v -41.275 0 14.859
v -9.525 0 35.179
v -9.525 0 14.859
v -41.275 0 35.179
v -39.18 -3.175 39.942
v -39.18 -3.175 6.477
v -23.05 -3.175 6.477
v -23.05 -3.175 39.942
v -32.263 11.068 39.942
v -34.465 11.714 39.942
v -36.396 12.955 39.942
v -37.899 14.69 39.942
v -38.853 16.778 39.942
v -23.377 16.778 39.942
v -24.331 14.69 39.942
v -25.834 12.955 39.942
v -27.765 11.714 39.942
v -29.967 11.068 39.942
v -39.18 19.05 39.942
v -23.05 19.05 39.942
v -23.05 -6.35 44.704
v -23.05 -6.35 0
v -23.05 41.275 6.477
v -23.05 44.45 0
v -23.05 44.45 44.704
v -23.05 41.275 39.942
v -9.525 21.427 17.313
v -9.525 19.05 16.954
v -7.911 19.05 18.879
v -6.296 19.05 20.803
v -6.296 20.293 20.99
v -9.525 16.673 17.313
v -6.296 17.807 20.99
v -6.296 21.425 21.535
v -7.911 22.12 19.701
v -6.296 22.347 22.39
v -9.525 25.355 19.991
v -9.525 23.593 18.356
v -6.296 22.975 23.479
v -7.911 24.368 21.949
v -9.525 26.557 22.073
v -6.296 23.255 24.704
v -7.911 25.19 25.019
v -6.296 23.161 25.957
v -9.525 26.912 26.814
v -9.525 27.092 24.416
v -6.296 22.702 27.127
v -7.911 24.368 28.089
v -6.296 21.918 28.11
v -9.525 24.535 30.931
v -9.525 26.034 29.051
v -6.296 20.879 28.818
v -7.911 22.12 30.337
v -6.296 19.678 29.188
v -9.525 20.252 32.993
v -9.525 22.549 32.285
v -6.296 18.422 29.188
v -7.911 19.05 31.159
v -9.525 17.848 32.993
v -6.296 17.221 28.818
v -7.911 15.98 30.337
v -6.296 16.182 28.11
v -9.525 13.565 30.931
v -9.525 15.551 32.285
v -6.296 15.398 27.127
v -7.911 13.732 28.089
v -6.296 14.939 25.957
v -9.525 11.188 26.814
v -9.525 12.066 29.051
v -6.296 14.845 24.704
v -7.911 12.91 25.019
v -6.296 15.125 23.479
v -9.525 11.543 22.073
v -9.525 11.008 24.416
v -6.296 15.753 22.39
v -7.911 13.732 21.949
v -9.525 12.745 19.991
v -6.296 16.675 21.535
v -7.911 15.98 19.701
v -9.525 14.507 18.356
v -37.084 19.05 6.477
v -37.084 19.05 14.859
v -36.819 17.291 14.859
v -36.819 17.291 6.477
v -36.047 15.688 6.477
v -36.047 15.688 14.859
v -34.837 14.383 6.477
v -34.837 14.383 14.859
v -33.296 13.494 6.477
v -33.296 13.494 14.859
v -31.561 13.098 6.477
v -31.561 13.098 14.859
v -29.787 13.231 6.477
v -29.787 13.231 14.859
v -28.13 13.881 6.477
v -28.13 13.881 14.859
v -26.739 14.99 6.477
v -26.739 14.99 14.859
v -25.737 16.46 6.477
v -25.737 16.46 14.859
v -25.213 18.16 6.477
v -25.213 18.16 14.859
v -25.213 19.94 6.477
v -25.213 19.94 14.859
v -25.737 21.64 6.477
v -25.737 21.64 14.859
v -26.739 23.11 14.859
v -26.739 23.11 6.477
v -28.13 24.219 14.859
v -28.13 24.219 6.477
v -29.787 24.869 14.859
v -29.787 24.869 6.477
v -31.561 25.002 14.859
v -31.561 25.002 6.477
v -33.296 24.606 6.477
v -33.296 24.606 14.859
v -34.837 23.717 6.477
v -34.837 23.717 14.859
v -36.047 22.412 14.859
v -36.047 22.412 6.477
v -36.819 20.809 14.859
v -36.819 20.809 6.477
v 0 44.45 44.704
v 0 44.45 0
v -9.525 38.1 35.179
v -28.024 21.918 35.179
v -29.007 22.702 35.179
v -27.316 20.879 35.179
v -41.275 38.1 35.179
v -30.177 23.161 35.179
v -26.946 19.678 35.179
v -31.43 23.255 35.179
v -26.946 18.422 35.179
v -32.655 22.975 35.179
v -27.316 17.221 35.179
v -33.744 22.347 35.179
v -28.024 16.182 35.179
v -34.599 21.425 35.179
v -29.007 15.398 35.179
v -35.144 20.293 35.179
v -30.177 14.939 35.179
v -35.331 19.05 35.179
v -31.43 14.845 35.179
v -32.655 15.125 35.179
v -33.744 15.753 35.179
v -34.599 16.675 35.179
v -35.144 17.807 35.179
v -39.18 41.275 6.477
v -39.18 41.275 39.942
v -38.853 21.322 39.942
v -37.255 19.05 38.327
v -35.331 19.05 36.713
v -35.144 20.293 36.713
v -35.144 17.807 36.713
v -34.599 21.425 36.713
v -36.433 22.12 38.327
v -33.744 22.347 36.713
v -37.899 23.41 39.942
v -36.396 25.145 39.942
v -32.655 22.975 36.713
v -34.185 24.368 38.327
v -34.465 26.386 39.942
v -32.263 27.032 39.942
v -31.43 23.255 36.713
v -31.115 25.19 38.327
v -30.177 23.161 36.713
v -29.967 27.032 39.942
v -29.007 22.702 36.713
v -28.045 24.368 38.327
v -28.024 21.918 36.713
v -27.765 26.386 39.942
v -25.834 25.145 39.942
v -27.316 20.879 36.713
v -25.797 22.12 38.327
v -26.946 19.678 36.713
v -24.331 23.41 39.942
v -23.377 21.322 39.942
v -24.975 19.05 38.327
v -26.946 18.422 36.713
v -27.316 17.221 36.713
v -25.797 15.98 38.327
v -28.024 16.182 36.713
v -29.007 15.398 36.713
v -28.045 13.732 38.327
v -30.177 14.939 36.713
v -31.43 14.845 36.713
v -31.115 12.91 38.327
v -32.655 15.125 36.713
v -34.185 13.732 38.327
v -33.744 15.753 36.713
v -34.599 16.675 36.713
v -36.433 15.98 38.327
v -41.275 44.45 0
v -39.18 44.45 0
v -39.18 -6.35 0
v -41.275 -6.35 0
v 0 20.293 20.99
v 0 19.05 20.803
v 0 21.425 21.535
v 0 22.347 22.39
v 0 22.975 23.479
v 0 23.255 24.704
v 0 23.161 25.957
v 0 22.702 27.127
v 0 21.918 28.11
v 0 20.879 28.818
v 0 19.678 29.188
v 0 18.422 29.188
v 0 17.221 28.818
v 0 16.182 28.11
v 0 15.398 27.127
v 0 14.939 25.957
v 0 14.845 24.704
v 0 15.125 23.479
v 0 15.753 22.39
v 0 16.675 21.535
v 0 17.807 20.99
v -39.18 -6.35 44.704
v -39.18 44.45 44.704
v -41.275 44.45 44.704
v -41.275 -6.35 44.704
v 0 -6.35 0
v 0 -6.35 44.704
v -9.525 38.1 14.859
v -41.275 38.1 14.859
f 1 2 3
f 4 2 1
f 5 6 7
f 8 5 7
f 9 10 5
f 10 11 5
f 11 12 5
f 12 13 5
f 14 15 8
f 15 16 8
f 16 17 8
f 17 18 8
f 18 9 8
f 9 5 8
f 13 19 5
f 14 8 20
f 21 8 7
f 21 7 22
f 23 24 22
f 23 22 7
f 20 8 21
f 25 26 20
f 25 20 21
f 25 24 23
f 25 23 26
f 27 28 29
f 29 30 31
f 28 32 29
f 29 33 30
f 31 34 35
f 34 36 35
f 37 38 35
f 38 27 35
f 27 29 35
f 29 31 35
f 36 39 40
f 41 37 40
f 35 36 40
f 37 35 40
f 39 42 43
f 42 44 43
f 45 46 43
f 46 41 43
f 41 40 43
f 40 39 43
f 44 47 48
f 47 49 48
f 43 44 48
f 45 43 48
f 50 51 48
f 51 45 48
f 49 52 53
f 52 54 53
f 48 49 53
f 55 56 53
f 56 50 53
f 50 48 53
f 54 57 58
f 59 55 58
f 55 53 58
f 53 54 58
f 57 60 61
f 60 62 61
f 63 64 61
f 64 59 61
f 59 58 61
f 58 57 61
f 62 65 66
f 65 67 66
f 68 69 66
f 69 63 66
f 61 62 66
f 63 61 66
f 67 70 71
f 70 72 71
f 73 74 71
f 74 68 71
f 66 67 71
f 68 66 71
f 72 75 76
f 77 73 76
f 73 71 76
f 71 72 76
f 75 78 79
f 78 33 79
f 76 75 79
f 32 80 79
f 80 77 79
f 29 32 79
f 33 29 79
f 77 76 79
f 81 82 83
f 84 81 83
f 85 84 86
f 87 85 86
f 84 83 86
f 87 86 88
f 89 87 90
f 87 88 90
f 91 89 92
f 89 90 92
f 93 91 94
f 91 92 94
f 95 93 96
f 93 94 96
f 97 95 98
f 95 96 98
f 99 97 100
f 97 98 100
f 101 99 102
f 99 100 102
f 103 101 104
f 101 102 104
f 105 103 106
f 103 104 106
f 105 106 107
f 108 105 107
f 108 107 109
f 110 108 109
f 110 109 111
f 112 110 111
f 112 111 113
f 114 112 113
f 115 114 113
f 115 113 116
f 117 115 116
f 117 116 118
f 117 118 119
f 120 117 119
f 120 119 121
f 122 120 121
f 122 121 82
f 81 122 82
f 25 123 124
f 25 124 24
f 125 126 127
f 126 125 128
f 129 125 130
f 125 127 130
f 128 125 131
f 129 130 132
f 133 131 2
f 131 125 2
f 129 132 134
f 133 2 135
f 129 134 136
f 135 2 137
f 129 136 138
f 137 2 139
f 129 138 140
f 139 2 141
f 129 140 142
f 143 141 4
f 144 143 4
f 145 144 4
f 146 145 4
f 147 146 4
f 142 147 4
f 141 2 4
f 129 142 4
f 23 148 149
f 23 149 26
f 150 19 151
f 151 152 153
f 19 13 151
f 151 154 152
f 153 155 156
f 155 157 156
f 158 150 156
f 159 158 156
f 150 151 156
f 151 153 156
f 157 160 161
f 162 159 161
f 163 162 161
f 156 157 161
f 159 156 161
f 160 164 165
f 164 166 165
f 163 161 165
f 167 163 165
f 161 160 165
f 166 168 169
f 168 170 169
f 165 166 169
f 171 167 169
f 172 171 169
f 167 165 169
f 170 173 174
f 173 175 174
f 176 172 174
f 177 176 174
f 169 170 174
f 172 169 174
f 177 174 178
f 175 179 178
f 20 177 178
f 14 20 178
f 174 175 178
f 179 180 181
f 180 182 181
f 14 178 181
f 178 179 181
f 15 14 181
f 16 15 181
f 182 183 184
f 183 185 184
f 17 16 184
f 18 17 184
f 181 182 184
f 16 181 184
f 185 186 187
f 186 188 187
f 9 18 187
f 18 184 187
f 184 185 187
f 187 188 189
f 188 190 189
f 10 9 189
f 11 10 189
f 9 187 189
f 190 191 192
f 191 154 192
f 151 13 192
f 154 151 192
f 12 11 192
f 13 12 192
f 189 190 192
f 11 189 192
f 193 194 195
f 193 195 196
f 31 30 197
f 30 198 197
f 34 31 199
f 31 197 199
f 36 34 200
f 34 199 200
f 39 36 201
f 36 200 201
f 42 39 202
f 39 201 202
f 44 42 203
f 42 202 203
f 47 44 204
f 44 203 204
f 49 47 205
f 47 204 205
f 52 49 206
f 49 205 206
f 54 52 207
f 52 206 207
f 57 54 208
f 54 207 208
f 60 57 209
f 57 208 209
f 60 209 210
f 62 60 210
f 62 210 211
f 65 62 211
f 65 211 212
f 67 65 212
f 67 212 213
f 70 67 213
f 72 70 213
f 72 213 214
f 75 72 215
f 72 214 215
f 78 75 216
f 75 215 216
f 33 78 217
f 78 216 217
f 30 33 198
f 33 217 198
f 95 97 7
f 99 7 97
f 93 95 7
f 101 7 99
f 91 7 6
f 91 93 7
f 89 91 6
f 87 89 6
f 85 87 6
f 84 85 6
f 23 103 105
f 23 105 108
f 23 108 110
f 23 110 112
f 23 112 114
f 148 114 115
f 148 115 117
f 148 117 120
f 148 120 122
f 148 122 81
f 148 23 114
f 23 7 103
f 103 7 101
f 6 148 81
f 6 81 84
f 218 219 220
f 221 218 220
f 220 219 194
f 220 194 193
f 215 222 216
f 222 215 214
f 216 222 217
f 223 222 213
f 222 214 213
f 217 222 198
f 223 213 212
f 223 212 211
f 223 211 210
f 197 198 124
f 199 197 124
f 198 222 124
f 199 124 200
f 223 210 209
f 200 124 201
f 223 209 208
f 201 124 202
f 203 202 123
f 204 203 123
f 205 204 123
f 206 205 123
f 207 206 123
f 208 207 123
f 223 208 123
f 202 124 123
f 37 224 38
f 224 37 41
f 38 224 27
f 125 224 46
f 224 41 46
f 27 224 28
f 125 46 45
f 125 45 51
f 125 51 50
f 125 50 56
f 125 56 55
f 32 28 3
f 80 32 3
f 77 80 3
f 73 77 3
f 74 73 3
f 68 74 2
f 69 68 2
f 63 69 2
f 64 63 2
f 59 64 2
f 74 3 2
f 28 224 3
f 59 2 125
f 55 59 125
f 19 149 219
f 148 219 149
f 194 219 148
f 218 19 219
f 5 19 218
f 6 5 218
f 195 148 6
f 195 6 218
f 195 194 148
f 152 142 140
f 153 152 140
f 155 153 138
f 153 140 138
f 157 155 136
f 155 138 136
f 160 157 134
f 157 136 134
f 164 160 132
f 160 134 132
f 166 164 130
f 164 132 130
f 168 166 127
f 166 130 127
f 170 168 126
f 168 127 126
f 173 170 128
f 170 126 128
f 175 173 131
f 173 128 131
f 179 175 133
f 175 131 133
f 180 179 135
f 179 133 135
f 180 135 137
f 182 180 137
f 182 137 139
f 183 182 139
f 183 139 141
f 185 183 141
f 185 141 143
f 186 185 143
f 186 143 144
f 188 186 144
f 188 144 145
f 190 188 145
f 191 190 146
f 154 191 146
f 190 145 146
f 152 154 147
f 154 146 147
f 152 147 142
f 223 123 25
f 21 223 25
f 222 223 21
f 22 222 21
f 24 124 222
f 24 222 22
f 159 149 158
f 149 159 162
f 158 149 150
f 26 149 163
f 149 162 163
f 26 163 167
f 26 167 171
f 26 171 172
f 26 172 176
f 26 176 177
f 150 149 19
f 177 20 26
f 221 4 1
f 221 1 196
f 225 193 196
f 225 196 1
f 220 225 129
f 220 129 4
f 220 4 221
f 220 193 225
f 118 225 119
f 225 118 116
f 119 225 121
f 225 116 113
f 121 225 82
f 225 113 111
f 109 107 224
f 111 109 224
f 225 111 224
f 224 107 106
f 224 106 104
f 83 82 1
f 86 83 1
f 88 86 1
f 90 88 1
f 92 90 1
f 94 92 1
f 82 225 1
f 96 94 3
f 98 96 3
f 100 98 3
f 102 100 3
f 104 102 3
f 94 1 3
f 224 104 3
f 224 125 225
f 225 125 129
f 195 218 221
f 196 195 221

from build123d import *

# Parameters (mm, degrees)
BOSS_EXTRUDE1_DEPTH                 = 38.1
SKETCH2_W                           = 41.275
SKETCH2_H                           = 44.704
END_CAPS_DEPTH                      = 6.35
CHANNEL_COUNTERSINK_PRE_D           = 8.4328
CHANNEL_COUNTERSINK_PRE_DEPTH       = 9.525
CHANNEL_COUNTERSINK_PRE_CSINK_D     = 16.129
CHANNEL_COUNTERSINK_PRE_CSINK_ANGLE = 100
CHANNEL_COUNTERSINK_PRE_TIP         = 2.533468714
MOUNTING_COUNTERSINK_D              = 8.4328
MOUNTING_COUNTERSINK_CSINK_D        = 16.129
MOUNTING_COUNTERSINK_CSINK_ANGLE    = 100
SKETCH13_W                          = 16.129
SKETCH13_H                          = 4.7625
CHANNEL_TOP_AND_BOTTOM_DEPTH        = 51.8
CHANNEL_COUNTERSINK_D               = 8.4328
CHANNEL_COUNTERSINK_DEPTH           = 4.7625
CHANNEL_COUNTERSINK_CSINK_D         = 16.129
CHANNEL_COUNTERSINK_CSINK_ANGLE     = 100
CHANNEL_COUNTERSINK_TIP             = 2.533468714
SKETCH16_W                          = 16.129
SKETCH16_H                          = 3.175
CHANNEL_LEFT_RIGHT_DEPTH            = 45.704
SKETCH17_W                          = 16.129
SKETCH17_H                          = 6.477
CUT_EXTRUDE3_DEPTH                  = 51.8
F_5_16_0_47_DIAMETER_HOLE1_D        = 11.938
F_5_16_0_47_DIAMETER_HOLE1_DEPTH    = 14.859


with BuildPart() as part:
    # Sketch1 → Boss-Extrude1 (new body)
    with BuildSketch(Plane(origin=(0, 0, 0), x_dir=(1, 0, 0), z_dir=(0, 1, 0))):
        Polygon((0, 0), (-41.275, 0), (-41.275, -14.859), (-9.525, -14.859), (-9.525, -35.179), (-41.275, -35.179), (-41.275, -44.704), (0, -44.704), align=None)
    extrude(amount=BOSS_EXTRUDE1_DEPTH)

    # Sketch2 → End Caps (add)
    with BuildSketch(Plane(origin=(0, 38.1, 0), x_dir=(-1, 0, 0), z_dir=(0, 1, 0))):
        with Locations((20.6375, 22.352)):
            Rectangle(SKETCH2_W, SKETCH2_H)
    end_caps = extrude(amount=END_CAPS_DEPTH)

    # Mirror1: End Caps across plane
    add(end_caps.mirror(Plane(origin=(0, 19.05, 0), x_dir=(0, 0, 1), z_dir=(0, -1, 0))))

    # Channel Countersink-PRE
    with Locations(Plane.XY.offset(44.704)):
        with Locations((-31.115, 19.05)):
            CounterSinkHole(CHANNEL_COUNTERSINK_PRE_D / 2, CHANNEL_COUNTERSINK_PRE_CSINK_D / 2, depth=CHANNEL_COUNTERSINK_PRE_DEPTH, counter_sink_angle=CHANNEL_COUNTERSINK_PRE_CSINK_ANGLE)
            with Locations((0, 0, -(CHANNEL_COUNTERSINK_PRE_DEPTH + CHANNEL_COUNTERSINK_PRE_TIP / 2))):  # 118° drill point
                Cone(0, CHANNEL_COUNTERSINK_PRE_D / 2, CHANNEL_COUNTERSINK_PRE_TIP, mode=Mode.SUBTRACT)

    # Mounting Countersink (through all)
    with Locations(Plane.ZY.offset(9.525)):
        with Locations((25.019, 19.05)):
            CounterSinkHole(MOUNTING_COUNTERSINK_D / 2, MOUNTING_COUNTERSINK_CSINK_D / 2, counter_sink_angle=MOUNTING_COUNTERSINK_CSINK_ANGLE)

    # Sketch13 → Channel Top and Bottom (cut, through all)
    with BuildSketch(Plane.XZ.offset(6.35)):
        with Locations((-31.115, 42.32275)):
            Rectangle(SKETCH13_W, SKETCH13_H)
    extrude(amount=-CHANNEL_TOP_AND_BOTTOM_DEPTH, mode=Mode.SUBTRACT)

    # Channel Countersink
    with Locations(Plane.XY.offset(39.9415)):
        with Locations((-31.115, 19.05)):
            CounterSinkHole(CHANNEL_COUNTERSINK_D / 2, CHANNEL_COUNTERSINK_CSINK_D / 2, depth=CHANNEL_COUNTERSINK_DEPTH, counter_sink_angle=CHANNEL_COUNTERSINK_CSINK_ANGLE)
            with Locations((0, 0, -(CHANNEL_COUNTERSINK_DEPTH + CHANNEL_COUNTERSINK_TIP / 2))):  # 118° drill point
                Cone(0, CHANNEL_COUNTERSINK_D / 2, CHANNEL_COUNTERSINK_TIP, mode=Mode.SUBTRACT)

    # Sketch16 → Channel Left Right (cut, through all)
    with BuildSketch(Plane(origin=(0, 0, 0), x_dir=(1, 0, 0), z_dir=(0, 0, -1))):
        with Locations((-31.115, 4.7625)):
            Rectangle(SKETCH16_W, SKETCH16_H)
    channel_left_right = extrude(amount=-CHANNEL_LEFT_RIGHT_DEPTH, mode=Mode.SUBTRACT)

    # Sketch17 → Cut-Extrude3 (cut, through all)
    with BuildSketch(Plane(origin=(0, 44.45, 0), x_dir=(-1, 0, 0), z_dir=(0, 1, 0))):
        with Locations((31.115, 3.2385)):
            Rectangle(SKETCH17_W, SKETCH17_H)
    extrude(amount=-CUT_EXTRUDE3_DEPTH, mode=Mode.SUBTRACT)

    # Mirror3: Channel Left Right across plane
    add(channel_left_right.mirror(Plane(origin=(0, 19.05, 0), x_dir=(0, 0, 1), z_dir=(0, -1, 0))), mode=Mode.SUBTRACT)

    # 5/16 (0.47) Diameter Hole1
    with Locations(Plane(origin=(0, 0, 0), x_dir=(1, 0, 0), z_dir=(0, 0, -1))):
        with Locations((-31.115, -19.05)):
            Hole(F_5_16_0_47_DIAMETER_HOLE1_D / 2, depth=F_5_16_0_47_DIAMETER_HOLE1_DEPTH)


solid = part.part
